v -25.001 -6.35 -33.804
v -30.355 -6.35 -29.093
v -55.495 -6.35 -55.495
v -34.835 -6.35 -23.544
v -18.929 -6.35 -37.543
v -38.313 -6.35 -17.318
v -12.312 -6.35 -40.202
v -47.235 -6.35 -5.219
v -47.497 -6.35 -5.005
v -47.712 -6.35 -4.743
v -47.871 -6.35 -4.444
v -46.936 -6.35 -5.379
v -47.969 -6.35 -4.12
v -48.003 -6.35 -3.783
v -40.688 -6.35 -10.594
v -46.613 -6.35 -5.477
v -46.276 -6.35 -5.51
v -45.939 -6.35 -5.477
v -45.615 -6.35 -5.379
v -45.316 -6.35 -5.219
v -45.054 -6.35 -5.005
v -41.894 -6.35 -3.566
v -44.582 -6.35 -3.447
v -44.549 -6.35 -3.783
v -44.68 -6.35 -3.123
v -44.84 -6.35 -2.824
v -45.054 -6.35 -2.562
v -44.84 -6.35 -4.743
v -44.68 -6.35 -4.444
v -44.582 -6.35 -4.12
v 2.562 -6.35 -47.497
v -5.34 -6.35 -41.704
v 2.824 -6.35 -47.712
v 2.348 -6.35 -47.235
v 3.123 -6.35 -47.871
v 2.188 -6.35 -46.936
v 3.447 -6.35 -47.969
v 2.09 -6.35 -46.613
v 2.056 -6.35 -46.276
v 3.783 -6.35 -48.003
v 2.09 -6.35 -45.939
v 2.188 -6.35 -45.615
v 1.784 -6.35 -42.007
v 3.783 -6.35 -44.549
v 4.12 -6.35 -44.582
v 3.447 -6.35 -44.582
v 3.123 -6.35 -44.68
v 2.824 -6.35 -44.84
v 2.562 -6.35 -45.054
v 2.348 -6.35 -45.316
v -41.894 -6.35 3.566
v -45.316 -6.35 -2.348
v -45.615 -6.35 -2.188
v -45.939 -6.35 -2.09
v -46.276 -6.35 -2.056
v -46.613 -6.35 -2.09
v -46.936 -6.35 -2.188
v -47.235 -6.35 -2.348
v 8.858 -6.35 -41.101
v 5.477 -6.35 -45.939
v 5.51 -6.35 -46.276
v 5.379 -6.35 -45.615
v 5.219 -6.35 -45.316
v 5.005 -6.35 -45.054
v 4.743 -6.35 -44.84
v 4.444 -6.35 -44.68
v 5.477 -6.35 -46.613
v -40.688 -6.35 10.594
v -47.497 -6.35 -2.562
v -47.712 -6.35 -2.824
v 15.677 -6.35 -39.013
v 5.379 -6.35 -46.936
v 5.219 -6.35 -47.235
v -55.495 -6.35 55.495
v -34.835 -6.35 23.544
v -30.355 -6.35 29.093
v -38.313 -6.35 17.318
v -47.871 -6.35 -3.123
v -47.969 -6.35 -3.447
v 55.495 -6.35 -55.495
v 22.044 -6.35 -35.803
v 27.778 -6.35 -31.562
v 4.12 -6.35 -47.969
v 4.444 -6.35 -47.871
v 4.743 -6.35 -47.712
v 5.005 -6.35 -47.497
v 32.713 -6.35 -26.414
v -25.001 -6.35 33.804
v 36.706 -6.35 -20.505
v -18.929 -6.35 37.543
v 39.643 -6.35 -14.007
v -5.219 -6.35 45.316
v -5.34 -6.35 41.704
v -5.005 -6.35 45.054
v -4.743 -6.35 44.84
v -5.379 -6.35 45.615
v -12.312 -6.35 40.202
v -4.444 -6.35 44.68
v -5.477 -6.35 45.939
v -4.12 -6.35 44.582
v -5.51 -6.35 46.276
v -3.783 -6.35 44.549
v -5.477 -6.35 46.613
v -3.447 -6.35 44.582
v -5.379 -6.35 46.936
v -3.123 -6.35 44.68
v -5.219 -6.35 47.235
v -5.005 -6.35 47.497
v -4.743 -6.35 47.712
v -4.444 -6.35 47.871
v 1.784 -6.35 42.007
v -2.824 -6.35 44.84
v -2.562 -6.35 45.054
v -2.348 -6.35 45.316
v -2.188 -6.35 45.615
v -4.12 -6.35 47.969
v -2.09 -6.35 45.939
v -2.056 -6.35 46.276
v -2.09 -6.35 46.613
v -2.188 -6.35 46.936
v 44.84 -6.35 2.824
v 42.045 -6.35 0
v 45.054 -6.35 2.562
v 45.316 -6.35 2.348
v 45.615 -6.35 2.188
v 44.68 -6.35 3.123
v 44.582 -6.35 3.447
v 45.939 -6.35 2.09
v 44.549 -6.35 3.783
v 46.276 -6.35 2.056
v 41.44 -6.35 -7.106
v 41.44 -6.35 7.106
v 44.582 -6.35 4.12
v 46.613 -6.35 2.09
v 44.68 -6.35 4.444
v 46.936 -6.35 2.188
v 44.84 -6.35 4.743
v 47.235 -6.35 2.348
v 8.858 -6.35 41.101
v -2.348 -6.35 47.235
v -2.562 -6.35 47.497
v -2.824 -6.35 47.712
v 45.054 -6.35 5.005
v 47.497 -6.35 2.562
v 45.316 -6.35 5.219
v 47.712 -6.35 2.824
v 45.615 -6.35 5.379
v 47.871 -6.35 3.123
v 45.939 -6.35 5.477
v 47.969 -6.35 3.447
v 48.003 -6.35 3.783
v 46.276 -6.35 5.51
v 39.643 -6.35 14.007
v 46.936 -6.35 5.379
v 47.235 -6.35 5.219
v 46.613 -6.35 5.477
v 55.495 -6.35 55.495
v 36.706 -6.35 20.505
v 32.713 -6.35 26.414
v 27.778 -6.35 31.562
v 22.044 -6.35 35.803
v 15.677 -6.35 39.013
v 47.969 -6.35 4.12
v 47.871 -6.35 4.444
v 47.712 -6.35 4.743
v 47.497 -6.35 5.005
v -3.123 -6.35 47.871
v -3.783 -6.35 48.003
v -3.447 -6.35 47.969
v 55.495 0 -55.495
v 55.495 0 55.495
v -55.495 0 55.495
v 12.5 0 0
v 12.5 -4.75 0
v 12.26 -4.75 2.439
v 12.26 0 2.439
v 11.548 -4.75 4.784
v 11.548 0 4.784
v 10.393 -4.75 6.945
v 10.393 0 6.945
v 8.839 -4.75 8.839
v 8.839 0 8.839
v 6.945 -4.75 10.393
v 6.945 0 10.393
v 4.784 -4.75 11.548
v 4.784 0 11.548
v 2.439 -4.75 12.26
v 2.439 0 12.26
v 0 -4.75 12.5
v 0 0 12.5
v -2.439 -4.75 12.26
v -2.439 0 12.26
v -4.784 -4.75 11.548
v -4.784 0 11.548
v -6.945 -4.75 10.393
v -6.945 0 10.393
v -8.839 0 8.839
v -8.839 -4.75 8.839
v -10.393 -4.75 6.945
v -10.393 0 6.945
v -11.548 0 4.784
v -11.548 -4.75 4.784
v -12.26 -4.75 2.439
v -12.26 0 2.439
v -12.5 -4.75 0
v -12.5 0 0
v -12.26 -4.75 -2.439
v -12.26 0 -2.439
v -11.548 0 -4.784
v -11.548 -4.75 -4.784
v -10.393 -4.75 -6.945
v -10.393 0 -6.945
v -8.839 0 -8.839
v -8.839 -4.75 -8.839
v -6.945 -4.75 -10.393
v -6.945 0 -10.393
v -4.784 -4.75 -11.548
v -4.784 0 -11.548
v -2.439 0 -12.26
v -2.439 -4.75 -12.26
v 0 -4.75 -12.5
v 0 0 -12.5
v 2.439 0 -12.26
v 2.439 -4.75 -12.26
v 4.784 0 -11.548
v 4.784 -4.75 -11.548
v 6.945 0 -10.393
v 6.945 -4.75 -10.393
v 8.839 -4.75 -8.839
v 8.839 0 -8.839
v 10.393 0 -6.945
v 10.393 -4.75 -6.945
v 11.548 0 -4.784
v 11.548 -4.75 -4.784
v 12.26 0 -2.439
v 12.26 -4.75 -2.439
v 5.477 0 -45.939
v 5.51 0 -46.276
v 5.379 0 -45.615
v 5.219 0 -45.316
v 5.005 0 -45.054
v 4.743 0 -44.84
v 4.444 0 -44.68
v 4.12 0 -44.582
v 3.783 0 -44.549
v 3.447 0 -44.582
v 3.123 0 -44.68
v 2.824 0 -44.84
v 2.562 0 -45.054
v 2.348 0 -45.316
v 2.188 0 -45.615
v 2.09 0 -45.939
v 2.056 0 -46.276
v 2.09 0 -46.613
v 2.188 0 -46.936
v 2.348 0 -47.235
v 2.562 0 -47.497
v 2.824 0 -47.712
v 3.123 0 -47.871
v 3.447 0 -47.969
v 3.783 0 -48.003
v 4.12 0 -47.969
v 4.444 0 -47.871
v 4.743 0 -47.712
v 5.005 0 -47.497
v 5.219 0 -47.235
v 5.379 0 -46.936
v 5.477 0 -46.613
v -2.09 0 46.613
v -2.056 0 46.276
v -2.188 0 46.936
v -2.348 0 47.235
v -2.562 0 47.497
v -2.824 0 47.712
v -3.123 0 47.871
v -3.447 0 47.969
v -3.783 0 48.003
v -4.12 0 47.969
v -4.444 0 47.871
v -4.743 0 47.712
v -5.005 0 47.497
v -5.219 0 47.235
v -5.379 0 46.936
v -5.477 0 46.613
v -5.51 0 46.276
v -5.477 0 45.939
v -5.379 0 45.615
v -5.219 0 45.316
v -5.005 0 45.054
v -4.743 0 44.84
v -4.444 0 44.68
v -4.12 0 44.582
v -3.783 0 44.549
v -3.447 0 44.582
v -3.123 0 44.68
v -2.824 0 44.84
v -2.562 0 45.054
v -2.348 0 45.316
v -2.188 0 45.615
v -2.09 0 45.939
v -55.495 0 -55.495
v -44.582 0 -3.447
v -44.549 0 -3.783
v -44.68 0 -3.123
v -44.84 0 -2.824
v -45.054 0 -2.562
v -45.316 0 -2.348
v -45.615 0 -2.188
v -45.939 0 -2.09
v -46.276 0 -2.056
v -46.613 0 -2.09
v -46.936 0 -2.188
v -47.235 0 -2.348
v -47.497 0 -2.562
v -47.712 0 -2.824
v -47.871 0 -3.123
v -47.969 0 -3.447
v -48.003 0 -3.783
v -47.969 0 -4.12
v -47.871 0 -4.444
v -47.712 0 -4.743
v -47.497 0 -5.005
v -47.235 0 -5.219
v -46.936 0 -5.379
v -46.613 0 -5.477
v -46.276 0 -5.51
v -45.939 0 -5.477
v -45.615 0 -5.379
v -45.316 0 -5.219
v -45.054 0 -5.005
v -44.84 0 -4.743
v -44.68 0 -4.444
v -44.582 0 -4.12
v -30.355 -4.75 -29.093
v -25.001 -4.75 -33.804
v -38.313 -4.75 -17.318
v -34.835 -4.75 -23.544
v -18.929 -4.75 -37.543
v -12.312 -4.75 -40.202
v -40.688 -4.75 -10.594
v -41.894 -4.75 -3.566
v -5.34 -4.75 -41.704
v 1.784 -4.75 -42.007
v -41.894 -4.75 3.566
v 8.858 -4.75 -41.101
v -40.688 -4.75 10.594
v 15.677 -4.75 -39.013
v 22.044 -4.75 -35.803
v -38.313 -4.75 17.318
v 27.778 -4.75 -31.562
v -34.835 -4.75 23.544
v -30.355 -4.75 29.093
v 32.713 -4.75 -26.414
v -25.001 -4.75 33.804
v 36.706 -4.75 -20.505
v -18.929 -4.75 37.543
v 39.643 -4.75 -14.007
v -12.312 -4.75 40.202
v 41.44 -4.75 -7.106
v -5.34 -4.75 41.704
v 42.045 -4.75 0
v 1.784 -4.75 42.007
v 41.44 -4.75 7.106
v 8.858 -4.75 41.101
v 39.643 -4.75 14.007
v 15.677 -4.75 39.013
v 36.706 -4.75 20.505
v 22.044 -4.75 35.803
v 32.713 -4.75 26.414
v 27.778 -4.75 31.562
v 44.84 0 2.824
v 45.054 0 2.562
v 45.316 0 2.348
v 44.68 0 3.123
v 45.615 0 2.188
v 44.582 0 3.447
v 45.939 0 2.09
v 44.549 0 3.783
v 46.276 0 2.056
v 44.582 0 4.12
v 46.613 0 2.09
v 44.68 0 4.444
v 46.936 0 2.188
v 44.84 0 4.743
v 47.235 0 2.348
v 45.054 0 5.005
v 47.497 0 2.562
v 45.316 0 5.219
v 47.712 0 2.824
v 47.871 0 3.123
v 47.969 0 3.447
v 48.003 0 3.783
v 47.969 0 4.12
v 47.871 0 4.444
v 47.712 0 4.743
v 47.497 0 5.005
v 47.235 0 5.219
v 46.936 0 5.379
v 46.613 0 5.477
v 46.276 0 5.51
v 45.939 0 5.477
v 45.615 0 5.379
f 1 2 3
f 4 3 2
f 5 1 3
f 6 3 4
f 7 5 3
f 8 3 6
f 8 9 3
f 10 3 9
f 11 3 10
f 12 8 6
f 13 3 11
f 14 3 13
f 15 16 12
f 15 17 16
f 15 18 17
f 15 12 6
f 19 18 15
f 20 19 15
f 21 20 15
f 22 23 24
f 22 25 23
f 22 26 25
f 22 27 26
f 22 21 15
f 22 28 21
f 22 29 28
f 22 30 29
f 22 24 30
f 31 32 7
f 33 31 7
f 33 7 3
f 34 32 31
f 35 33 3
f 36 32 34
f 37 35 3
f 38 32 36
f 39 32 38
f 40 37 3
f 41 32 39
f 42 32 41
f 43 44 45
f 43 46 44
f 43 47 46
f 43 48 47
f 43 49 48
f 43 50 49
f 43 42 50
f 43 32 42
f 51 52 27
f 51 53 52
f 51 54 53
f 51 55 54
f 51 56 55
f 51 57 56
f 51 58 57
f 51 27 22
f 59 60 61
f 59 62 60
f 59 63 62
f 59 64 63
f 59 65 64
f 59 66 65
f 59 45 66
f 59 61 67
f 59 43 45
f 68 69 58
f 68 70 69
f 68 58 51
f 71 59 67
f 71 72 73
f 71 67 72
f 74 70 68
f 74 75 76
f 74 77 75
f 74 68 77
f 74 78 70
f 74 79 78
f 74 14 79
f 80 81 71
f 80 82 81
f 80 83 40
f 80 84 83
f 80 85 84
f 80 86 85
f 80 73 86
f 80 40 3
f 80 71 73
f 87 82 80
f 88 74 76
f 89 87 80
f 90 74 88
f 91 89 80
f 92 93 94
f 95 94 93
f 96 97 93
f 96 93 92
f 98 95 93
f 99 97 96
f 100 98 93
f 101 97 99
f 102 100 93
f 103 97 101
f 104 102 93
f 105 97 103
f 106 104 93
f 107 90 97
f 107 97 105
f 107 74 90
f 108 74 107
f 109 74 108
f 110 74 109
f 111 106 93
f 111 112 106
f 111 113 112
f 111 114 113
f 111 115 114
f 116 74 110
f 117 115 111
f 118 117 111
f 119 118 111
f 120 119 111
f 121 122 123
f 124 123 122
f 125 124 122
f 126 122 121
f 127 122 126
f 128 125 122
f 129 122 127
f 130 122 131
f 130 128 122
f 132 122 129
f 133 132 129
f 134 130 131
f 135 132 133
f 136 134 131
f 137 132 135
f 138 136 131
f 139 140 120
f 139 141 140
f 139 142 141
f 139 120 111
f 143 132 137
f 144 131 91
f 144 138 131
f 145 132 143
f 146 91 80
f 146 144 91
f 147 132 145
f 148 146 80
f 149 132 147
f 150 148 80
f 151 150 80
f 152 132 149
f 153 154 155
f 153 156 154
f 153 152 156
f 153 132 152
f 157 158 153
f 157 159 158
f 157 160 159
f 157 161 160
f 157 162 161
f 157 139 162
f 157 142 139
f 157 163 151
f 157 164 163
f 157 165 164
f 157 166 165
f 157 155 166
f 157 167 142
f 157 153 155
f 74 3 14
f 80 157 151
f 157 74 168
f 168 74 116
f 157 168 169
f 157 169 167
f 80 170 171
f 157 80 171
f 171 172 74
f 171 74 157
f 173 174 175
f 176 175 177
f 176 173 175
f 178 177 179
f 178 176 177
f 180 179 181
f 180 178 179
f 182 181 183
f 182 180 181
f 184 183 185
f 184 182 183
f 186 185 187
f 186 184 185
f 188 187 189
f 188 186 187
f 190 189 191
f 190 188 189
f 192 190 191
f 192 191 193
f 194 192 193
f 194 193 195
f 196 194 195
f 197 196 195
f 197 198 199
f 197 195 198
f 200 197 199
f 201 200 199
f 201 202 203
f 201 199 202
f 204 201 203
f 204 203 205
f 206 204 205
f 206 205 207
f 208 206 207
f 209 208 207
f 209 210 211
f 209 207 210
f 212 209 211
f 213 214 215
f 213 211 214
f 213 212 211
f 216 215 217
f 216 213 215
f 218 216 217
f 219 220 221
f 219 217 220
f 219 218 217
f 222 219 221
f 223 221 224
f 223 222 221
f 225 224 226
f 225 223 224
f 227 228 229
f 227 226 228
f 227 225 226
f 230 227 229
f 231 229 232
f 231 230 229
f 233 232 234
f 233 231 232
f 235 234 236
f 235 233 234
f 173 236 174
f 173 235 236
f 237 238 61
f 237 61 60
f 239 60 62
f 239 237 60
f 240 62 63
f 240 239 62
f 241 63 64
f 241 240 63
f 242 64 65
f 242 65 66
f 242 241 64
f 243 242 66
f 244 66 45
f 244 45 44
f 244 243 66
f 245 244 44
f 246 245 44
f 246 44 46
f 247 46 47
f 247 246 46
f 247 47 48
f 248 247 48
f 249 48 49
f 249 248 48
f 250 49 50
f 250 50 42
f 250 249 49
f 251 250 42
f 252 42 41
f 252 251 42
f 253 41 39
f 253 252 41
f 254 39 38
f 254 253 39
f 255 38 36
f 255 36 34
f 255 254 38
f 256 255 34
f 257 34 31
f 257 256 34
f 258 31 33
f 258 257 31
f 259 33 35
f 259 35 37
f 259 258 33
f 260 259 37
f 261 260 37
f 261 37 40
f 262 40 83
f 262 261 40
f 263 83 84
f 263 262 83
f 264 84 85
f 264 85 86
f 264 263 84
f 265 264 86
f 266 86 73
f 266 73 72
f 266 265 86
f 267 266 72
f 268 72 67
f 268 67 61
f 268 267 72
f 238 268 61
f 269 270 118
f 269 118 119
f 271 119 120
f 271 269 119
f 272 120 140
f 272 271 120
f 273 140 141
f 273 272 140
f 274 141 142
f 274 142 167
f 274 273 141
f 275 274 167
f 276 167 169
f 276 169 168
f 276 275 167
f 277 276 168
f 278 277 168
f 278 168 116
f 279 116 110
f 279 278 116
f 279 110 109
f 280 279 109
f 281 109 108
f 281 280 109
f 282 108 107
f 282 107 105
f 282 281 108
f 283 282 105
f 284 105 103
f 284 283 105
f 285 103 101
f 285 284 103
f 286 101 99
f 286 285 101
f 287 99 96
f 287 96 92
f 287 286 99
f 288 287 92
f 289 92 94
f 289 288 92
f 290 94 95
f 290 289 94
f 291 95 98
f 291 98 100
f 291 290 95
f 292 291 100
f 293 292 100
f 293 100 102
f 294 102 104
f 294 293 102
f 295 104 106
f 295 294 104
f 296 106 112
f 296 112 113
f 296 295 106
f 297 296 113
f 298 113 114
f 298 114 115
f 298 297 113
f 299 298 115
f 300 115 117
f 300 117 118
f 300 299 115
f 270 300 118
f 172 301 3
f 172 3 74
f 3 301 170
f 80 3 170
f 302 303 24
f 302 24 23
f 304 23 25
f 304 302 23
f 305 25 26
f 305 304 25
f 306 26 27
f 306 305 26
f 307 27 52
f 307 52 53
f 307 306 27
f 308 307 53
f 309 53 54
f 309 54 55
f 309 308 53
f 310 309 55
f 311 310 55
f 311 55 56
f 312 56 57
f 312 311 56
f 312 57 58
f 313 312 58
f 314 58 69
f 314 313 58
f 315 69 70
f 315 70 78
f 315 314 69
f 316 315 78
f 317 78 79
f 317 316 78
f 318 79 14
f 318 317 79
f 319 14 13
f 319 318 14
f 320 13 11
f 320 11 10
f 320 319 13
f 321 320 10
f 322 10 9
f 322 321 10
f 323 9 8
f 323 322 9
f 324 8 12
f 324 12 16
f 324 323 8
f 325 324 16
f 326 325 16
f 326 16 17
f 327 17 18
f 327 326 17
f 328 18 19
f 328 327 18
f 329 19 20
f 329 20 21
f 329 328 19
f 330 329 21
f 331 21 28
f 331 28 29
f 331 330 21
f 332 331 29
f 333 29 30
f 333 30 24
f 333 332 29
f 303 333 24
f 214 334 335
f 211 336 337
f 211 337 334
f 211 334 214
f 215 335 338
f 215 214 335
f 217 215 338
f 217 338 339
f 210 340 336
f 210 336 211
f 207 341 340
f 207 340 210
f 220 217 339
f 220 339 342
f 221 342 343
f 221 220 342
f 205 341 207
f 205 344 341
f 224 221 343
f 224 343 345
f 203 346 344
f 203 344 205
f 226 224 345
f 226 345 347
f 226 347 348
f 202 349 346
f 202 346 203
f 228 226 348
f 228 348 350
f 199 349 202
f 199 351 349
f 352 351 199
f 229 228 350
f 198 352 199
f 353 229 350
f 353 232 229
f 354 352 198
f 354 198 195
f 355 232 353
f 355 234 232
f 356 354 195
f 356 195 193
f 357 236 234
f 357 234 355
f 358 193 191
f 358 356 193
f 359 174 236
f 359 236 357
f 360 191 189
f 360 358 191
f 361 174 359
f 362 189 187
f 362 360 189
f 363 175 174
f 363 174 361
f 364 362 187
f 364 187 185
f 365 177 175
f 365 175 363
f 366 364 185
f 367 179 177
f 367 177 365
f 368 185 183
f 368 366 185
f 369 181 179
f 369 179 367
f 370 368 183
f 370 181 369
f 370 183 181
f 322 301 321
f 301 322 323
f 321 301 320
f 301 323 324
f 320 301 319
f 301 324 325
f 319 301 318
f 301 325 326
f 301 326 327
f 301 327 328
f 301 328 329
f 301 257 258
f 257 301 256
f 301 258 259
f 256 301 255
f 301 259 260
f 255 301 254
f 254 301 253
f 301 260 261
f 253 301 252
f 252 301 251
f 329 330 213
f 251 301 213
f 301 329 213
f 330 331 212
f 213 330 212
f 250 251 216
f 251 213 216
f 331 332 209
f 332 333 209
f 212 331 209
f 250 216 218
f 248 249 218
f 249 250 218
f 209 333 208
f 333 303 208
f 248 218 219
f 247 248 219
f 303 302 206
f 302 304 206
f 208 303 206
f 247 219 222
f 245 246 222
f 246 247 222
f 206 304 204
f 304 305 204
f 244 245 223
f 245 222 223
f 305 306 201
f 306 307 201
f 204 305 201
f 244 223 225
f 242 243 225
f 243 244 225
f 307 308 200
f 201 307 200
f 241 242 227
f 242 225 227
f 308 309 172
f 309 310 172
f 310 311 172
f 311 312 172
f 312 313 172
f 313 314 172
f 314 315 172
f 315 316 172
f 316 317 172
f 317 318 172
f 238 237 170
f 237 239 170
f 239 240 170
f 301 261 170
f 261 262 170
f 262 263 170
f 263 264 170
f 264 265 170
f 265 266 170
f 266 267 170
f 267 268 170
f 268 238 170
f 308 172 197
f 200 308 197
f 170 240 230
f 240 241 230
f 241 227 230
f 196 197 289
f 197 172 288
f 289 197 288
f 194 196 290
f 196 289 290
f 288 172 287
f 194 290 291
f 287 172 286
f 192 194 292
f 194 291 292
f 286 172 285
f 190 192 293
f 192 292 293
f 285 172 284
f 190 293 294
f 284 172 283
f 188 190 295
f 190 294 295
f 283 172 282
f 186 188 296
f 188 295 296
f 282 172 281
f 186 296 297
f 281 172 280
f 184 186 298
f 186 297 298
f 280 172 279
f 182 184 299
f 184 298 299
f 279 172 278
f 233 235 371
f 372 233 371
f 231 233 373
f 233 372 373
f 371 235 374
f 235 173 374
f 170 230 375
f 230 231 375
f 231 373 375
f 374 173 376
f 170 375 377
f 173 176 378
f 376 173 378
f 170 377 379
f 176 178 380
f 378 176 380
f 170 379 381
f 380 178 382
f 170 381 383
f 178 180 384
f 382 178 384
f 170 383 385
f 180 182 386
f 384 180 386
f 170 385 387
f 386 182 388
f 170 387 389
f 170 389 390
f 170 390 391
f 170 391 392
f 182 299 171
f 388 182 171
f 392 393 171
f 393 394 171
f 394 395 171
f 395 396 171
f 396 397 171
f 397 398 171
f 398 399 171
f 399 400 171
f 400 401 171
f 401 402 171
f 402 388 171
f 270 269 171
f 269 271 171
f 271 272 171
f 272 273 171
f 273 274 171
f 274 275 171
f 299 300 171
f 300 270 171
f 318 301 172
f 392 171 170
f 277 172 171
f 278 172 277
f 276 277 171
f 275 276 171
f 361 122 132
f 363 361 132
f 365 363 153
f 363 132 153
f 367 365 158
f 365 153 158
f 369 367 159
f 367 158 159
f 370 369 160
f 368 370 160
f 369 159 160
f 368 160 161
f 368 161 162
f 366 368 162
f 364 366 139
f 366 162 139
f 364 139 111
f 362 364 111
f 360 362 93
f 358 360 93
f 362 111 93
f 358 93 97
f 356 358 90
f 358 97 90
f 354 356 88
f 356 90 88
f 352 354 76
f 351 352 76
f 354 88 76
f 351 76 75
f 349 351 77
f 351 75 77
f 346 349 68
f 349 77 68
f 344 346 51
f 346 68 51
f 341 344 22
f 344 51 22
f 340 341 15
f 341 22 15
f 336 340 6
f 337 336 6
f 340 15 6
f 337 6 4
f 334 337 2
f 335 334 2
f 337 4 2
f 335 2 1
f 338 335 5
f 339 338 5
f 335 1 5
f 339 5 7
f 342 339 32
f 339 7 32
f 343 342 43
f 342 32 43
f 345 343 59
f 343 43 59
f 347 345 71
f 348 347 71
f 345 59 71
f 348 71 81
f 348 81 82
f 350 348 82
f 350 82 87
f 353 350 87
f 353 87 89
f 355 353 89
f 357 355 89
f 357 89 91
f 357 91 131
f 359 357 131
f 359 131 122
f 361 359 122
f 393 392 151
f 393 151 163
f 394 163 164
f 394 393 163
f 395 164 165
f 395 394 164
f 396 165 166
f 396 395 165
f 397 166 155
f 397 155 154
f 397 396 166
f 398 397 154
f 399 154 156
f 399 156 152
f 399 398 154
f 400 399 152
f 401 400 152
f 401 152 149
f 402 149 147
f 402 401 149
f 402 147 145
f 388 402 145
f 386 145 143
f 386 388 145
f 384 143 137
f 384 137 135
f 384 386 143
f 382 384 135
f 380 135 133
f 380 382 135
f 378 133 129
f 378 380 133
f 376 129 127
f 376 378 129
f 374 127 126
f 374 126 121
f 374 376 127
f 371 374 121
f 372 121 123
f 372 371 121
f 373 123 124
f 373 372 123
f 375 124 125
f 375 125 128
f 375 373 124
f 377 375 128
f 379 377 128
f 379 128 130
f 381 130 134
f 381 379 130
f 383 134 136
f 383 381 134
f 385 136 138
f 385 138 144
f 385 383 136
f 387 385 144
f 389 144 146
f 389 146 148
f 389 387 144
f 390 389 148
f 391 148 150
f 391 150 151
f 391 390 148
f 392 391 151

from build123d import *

# Parameters (mm, degrees)
F0_W     = 110.99
F0_H     = 110.99
F0_R     = 1.727
F0_R_2   = 12.5
F1_DEPTH = 6.35
F2_R     = 42.045
F3_DEPTH = 1.6


# Not quite as in the source:
# - a feature names something its author has since deleted; it is built from what else it names


with BuildPart() as f1:
    # F0 (on Front) → F1 (new body)
    with BuildSketch(Plane.XZ):
        Rectangle(F0_W, F0_H)
        with Locations((-46.2755883255, -3.7834937726)):
            Circle(F0_R, mode=Mode.SUBTRACT)
        with Locations((3.7834937726, -46.2755883255)):
            Circle(F0_R, mode=Mode.SUBTRACT)
        with Locations((-3.7834937726, 46.2755883255)):
            Circle(F0_R, mode=Mode.SUBTRACT)
        Circle(F0_R_2, mode=Mode.SUBTRACT)
        with Locations((46.2755883255, 3.7834937726)):
            Circle(F0_R, mode=Mode.SUBTRACT)
    extrude(amount=F1_DEPTH)

    # F2 (on face) → F3 (cut)
    with BuildSketch(Plane.XZ.offset(6.35)):
        Circle(F2_R)
    extrude(amount=-F3_DEPTH, mode=Mode.SUBTRACT)


solid = f1.part
